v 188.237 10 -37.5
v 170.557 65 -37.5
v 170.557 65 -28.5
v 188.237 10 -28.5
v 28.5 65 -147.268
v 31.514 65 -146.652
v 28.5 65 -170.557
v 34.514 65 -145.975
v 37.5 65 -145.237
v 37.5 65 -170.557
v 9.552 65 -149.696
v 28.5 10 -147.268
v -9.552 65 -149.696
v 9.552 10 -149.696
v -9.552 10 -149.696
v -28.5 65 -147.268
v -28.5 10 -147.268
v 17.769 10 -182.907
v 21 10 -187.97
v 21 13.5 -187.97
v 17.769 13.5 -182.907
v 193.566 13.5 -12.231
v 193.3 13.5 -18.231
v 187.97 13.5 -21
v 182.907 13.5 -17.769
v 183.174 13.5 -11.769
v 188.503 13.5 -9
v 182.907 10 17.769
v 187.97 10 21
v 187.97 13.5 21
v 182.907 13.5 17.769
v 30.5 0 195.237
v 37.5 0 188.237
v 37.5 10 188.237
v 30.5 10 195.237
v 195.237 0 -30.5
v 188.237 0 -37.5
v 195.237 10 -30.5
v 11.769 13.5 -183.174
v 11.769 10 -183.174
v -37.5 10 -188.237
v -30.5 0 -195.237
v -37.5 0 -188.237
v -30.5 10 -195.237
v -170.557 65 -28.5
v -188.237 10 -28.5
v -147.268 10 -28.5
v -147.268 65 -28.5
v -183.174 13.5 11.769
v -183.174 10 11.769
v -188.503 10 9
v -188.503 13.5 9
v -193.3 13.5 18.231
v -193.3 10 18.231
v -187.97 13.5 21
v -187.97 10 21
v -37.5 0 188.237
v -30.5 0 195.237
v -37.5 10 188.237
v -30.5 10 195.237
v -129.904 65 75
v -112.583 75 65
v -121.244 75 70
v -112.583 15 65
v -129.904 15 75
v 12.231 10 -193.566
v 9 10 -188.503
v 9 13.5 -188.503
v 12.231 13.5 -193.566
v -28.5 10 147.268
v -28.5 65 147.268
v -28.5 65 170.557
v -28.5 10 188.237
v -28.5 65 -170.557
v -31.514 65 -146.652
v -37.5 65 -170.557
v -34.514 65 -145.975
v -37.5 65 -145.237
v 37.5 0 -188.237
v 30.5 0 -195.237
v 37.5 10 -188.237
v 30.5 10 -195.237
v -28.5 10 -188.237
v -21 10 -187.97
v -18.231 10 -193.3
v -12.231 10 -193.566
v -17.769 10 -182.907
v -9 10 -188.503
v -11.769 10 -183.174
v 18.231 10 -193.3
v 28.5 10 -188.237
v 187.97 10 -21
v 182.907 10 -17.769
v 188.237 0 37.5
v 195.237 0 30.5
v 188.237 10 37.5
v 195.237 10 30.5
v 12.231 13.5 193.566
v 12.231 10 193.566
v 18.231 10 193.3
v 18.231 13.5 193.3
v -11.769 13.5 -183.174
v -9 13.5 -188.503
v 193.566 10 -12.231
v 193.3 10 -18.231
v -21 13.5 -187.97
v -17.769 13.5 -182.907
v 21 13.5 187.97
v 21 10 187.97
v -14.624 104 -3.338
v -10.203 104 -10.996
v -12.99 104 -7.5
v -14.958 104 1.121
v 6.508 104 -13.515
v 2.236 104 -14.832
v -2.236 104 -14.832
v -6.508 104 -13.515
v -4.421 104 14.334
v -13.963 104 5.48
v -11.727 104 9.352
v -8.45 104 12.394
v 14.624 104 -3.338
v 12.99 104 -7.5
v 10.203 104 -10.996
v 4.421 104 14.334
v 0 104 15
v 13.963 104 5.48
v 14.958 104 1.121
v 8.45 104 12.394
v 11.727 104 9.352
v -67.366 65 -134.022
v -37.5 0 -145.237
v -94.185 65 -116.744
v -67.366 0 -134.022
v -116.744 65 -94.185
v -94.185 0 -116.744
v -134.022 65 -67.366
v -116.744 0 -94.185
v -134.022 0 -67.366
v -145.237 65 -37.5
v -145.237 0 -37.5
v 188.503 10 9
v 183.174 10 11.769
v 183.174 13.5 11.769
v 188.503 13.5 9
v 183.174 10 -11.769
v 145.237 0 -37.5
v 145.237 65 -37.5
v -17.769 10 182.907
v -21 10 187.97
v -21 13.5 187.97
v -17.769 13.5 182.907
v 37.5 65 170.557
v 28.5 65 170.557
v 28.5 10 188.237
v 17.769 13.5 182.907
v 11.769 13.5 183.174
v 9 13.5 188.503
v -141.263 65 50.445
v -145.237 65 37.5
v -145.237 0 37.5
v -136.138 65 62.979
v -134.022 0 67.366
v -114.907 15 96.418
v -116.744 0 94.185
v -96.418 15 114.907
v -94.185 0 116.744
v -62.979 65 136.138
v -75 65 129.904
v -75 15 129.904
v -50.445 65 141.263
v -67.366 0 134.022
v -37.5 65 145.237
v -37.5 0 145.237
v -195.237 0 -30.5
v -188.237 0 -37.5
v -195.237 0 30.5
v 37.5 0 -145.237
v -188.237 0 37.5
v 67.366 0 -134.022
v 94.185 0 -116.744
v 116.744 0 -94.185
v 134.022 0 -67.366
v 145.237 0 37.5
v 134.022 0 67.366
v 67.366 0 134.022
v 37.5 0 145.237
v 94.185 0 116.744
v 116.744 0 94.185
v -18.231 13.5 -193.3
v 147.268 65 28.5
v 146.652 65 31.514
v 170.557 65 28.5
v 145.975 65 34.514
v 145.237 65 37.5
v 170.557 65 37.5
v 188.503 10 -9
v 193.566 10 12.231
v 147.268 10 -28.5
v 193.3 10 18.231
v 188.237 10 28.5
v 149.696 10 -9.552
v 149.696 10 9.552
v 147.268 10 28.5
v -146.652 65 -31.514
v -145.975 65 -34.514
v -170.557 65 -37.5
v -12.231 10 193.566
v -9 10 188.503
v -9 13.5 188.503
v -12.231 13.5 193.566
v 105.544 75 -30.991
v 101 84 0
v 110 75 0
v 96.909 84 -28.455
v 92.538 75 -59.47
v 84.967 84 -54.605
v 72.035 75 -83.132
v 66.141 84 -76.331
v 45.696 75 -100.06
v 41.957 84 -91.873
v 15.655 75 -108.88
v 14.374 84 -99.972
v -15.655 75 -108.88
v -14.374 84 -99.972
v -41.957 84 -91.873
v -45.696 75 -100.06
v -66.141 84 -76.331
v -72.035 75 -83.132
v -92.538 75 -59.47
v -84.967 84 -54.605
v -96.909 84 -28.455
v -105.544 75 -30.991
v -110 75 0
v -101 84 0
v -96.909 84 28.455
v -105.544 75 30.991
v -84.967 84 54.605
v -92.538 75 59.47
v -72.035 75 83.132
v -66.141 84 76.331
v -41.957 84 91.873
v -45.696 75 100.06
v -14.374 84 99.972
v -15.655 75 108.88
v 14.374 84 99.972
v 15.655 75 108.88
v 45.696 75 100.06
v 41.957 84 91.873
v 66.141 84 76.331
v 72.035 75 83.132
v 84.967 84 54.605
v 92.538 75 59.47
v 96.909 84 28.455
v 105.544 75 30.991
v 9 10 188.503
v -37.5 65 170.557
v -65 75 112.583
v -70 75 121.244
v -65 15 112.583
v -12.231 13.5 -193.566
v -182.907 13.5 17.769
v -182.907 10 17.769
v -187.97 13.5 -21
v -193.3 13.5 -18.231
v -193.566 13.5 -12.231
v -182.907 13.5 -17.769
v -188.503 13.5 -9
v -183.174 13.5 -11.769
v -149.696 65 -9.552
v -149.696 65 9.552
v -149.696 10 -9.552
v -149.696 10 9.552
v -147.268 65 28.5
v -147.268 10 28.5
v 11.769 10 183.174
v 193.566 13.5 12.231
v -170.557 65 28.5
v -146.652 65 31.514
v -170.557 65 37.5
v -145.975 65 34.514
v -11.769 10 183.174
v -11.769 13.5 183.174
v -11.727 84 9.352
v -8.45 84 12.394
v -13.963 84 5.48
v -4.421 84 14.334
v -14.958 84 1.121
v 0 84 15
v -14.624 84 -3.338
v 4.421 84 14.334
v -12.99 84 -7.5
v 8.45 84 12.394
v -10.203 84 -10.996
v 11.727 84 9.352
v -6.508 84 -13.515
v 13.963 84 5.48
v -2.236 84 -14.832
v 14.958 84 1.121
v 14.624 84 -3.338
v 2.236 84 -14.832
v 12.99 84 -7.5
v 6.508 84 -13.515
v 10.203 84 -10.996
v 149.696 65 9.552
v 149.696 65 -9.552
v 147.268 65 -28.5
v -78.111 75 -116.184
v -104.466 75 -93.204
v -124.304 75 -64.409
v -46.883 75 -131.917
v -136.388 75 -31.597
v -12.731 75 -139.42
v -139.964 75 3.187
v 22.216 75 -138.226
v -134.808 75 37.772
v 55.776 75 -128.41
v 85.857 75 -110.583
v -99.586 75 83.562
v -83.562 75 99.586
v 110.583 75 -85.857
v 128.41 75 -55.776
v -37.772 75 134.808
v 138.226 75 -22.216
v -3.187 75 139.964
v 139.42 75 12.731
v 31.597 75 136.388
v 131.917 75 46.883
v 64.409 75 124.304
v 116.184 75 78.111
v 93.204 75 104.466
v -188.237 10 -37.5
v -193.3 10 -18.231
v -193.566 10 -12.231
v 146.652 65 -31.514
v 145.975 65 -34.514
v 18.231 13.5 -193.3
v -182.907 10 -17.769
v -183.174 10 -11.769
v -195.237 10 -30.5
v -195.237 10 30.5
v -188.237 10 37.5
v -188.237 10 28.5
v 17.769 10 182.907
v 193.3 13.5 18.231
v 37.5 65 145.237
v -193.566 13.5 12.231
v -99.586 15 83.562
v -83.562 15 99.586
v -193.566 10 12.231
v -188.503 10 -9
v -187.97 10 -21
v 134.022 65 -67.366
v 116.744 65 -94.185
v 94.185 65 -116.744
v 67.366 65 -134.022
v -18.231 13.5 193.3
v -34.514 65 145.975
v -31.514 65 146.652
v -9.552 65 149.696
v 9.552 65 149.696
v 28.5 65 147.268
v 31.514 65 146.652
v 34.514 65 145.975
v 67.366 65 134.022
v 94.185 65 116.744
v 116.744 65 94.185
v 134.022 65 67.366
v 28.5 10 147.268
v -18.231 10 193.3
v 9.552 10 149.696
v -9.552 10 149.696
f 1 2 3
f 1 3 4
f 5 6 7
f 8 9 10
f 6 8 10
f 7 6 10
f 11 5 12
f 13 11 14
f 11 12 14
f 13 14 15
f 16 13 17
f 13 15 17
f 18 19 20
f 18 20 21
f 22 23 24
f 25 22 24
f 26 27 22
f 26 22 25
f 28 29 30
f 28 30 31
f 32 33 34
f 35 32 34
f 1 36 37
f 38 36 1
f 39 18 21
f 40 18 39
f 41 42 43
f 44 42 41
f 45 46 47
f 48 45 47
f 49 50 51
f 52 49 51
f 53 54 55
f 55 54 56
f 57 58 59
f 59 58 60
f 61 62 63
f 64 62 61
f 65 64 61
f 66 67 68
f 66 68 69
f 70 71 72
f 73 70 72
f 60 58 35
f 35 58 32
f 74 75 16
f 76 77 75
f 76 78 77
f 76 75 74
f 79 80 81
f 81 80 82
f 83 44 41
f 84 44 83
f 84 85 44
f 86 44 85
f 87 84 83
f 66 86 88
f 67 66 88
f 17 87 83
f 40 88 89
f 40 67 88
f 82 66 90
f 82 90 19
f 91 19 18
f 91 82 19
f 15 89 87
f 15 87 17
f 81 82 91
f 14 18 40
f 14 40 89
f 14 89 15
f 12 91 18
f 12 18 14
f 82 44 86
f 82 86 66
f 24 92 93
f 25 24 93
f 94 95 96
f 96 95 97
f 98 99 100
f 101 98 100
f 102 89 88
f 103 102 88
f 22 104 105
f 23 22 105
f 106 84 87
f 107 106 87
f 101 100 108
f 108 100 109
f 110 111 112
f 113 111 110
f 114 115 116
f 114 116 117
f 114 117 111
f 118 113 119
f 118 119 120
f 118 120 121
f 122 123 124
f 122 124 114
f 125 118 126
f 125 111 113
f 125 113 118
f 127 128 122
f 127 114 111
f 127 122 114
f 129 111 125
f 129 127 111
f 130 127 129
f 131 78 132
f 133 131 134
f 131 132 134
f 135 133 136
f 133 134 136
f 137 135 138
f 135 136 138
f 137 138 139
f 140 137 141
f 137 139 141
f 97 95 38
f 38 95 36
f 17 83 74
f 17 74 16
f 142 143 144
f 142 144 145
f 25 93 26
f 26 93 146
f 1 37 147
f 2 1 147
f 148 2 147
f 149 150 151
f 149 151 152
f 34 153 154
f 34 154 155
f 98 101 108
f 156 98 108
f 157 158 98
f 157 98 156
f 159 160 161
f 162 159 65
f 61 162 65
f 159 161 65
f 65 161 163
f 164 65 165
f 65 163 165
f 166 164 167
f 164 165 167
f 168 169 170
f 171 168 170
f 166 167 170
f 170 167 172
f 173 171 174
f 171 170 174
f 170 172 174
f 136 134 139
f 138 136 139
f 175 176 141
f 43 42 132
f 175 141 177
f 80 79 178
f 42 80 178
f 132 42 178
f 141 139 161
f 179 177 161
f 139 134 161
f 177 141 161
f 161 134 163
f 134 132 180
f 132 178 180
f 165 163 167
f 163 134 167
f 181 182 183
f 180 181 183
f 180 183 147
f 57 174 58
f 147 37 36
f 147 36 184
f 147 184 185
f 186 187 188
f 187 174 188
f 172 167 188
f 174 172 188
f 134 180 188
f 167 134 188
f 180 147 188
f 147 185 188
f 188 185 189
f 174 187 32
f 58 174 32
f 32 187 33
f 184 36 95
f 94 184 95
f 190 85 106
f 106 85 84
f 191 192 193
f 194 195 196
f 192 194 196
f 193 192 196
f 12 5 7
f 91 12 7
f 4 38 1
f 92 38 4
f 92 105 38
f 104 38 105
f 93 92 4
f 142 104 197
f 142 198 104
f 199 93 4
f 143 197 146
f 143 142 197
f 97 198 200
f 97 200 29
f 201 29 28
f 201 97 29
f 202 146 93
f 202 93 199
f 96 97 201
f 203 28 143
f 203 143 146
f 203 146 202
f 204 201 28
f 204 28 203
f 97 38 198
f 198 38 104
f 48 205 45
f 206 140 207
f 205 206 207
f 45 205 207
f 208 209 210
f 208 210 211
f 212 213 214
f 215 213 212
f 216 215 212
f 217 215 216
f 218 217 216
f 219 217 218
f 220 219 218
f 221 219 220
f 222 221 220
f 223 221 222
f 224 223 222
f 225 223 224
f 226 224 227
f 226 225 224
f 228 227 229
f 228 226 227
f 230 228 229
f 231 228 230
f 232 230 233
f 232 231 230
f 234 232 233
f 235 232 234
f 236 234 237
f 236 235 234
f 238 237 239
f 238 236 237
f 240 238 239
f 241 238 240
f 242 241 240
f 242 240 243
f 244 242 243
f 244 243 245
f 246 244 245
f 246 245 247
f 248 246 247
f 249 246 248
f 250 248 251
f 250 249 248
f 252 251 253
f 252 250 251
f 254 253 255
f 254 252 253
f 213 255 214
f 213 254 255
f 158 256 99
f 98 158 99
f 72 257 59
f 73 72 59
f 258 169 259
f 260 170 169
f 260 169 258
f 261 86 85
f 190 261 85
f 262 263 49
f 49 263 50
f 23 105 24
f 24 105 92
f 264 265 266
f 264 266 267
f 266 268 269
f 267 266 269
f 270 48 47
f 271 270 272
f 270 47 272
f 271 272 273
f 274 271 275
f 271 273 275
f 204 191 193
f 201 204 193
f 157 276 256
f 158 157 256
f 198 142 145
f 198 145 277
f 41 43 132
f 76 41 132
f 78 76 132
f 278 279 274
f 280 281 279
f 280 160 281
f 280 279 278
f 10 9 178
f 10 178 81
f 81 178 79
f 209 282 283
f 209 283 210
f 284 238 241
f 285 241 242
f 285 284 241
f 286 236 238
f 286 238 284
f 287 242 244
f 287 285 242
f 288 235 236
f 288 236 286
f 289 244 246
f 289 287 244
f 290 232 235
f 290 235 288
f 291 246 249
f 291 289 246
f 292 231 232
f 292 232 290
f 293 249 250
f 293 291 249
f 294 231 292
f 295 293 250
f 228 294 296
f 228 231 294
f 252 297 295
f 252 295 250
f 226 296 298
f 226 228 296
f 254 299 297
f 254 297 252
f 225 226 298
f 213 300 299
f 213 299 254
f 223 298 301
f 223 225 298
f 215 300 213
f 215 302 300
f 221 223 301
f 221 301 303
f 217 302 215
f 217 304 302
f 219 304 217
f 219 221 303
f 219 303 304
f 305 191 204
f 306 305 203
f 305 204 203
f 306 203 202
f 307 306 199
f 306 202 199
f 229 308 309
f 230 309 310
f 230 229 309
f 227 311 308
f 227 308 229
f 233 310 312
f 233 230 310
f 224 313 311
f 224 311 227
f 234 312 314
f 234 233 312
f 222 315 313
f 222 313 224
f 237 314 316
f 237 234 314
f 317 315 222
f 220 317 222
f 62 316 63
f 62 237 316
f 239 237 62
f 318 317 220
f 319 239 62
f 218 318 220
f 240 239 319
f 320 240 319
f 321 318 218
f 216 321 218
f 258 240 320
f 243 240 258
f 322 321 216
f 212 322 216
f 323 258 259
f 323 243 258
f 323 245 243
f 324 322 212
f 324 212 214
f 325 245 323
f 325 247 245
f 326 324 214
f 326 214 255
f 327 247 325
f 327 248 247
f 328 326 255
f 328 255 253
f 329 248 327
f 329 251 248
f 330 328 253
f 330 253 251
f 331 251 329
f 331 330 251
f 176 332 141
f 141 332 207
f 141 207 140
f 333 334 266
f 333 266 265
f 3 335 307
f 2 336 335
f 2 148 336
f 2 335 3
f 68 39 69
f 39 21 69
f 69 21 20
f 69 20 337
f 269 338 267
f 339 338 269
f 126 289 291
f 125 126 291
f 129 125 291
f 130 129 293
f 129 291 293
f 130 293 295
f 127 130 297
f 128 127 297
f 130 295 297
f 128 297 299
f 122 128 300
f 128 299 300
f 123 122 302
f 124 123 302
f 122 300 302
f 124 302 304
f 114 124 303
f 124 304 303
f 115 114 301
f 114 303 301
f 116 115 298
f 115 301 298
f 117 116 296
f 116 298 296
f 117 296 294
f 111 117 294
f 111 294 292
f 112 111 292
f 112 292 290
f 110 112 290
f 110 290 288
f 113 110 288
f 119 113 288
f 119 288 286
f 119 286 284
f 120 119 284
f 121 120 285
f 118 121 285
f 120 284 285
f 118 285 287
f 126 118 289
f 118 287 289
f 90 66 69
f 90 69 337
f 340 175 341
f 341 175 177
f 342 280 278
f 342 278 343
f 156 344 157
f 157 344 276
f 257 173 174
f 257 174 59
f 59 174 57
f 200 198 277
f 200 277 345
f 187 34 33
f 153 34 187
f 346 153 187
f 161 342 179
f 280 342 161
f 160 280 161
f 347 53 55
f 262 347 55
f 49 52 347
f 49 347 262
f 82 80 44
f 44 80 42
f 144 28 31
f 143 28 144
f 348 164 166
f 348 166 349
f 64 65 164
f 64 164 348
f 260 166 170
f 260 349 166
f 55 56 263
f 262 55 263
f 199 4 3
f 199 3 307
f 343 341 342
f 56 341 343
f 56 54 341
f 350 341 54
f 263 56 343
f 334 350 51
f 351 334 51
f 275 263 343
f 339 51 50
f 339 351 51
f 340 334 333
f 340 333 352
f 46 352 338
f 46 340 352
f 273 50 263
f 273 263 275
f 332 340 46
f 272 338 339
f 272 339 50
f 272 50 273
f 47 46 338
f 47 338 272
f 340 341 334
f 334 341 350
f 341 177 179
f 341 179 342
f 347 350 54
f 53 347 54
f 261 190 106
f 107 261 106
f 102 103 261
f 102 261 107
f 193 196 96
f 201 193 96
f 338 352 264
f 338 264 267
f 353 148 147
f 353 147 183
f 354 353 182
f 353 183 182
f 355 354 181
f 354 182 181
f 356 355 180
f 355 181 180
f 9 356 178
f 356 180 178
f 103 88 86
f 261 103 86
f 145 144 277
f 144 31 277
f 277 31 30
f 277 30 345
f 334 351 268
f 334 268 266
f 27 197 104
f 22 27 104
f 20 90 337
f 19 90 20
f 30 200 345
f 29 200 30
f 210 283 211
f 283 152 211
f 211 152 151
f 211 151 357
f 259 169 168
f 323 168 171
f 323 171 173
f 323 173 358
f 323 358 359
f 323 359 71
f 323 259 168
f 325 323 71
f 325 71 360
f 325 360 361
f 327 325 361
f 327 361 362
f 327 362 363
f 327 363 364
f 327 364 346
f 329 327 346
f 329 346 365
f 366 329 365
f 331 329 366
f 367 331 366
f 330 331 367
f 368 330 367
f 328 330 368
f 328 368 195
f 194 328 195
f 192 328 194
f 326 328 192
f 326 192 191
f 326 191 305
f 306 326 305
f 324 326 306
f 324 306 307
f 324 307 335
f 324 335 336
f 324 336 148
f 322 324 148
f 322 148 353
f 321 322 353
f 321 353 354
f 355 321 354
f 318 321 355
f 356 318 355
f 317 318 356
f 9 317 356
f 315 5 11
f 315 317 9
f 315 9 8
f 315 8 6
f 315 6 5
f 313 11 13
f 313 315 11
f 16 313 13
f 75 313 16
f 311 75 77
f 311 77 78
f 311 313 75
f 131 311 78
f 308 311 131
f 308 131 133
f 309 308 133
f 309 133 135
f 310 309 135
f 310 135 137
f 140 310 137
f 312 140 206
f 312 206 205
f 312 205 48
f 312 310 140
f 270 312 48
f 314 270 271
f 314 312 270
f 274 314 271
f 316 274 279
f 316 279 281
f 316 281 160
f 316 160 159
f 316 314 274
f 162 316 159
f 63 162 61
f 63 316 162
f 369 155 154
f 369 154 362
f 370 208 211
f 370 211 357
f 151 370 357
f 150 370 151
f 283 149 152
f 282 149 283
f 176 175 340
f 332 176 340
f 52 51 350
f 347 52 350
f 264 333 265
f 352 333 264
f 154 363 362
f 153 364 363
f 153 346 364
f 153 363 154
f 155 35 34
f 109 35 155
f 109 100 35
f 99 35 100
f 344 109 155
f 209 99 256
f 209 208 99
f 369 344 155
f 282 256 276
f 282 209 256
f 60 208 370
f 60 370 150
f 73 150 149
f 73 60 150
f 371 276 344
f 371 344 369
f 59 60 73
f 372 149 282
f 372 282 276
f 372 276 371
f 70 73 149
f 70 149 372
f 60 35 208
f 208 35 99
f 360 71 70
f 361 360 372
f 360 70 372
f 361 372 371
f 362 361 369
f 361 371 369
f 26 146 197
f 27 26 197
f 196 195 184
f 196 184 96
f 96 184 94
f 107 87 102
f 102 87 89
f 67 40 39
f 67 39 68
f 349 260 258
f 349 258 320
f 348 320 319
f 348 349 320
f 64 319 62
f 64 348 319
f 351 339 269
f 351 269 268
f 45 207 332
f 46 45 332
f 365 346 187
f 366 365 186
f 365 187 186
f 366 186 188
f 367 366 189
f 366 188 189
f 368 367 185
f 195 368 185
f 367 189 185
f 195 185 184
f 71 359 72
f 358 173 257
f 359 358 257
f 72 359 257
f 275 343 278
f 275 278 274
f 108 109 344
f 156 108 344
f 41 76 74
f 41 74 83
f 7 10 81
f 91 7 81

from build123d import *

# Parameters (mm, degrees)
SKETCH1_R                    = 150
BOSS_EXTRUDE1_DEPTH          = 75
CHAMFER1_SIZE                = 10
BOSS_EXTRUDE2_START          = -75
BOSS_EXTRUDE2_DEPTH          = 10
CHAMFER2_SIZE                = 7
BOSS_EXTRUDE3_DEPTH          = 9
BOSS_EXTRUDE4_DEPTH          = 3.5
CIRPATTERN2_COUNT            = 4
CIRPATTERN2_COPY_1_DEPTH     = 9
CIRPATTERN2_COPY_2_DEPTH     = 9
CIRPATTERN2_COPY_3_DEPTH     = 9
CIRPATTERN2_COPY_4_DEPTH     = 3.5
CIRPATTERN2_COPY_5_DEPTH     = 3.5
CIRPATTERN2_COPY_6_DEPTH     = 3.5
CHAMFER2_OF_CIRPATTERN2_SIZE = 7
CUT_EXTRUDE2_START           = -60
CUT_EXTRUDE2_DEPTH           = 60
SKETCH7_R                    = 110
BOSS_EXTRUDE5_DEPTH          = 9
BOSS_EXTRUDE5_TAPER          = 45
SKETCH8_R                    = 15
BOSS_EXTRUDE6_DEPTH          = 20


with BuildPart() as part:
    # Sketch1 → Boss-Extrude1 (new body)
    with BuildSketch(Plane(origin=(0, 0, 0), x_dir=(1, 0, 0), z_dir=(0, 1, 0))):
        with Locations(Location((0, 0, 0), (0, 0, 270))):
            Circle(SKETCH1_R)
    extrude(amount=BOSS_EXTRUDE1_DEPTH)

    # Chamfer1
    chamfer1_edges = [part.edges().sort_by_distance(p)[0] for p in [
        (0, 75, -150),
    ]]
    chamfer(chamfer1_edges, length=CHAMFER1_SIZE)

    # Sketch2 → Boss-Extrude2 (add)
    with BuildSketch(Plane(origin=(0, 75, 0), x_dir=(1, 0, 0), z_dir=(0, 1, 0)).offset(BOSS_EXTRUDE2_START)):
        with BuildLine():
            Line((-145.236875483, 37.5), (-195.236875483, 37.5))
            Line((-195.236875483, 37.5), (-195.236875483, -37.5))
            Line((-195.236875483, -37.5), (-145.236875483, -37.5))
            ThreePointArc((-145.236875483, -37.5), (-150, 0), (-145.236875483, 37.5))
        make_face()
    boss_extrude2 = extrude(amount=BOSS_EXTRUDE2_DEPTH)

    # Chamfer2
    chamfer2_edges = [part.edges().sort_by_distance(p)[0] for p in [
        (-195.236875483, 5, -37.5),
        (-195.236875483, 5, 37.5),
    ]]
    chamfer(chamfer2_edges, length=CHAMFER2_SIZE)

    # Sketch4 → Boss-Extrude3 (add)
    with BuildSketch(Plane.XY.offset(37.5)):
        Polygon((-188.236875483, 10), (-145.236875483, 10), (-145.236875483, 65), (-170.556875483, 65), align=None)
    boss_extrude3 = extrude(amount=-BOSS_EXTRUDE3_DEPTH)

    # Sketch5 → Boss-Extrude4 (add)
    with BuildSketch(Plane(origin=(0, 10, 0), x_dir=(1, 0, 0), z_dir=(0, 1, 0))):
        Polygon((-183.173956068, -11.769233661), (-188.503341499, -9), (-193.566260913, -12.230766339), (-193.299794898, -18.230766339), (-187.970409467, -21), (-182.907490052, -17.769233661), align=None)
    boss_extrude4 = extrude(amount=BOSS_EXTRUDE4_DEPTH)

    # Mirror1: Boss-Extrude3, Boss-Extrude4 across plane
    add(boss_extrude3.mirror(Plane.XY))
    add(boss_extrude4.mirror(Plane.XY))

    # CirPattern2: Boss-Extrude2, Boss-Extrude3, Boss-Extrude4 ×4 about axis
    cirpattern2_axis = Axis((0, 0, 0), (0, 1, 0))
    add([boss_extrude2.rotate(cirpattern2_axis, i * 360 / CIRPATTERN2_COUNT) for i in range(1, CIRPATTERN2_COUNT)])
    add([boss_extrude3.rotate(cirpattern2_axis, i * 360 / CIRPATTERN2_COUNT) for i in range(1, CIRPATTERN2_COUNT)])
    add([boss_extrude4.rotate(cirpattern2_axis, i * 360 / CIRPATTERN2_COUNT) for i in range(1, CIRPATTERN2_COUNT)])

    # CirPattern2 copy 1 sketch → CirPattern2 copy 1 (add)
    with BuildSketch(Plane(origin=(-37.5, 0, 0), x_dir=(0, 0, -1), z_dir=(-1, 0, 0))):
        Polygon((-188.236875483, -10), (-145.236875483, -10), (-145.236875483, -65), (-170.556875483, -65), align=None)
    extrude(amount=-CIRPATTERN2_COPY_1_DEPTH)

    # CirPattern2 copy 2 sketch → CirPattern2 copy 2 (add)
    with BuildSketch(Plane(origin=(0, 0, 37.5), x_dir=(-1, 0, 0), z_dir=(0, 0, 1))):
        Polygon((-188.236875483, -10), (-145.236875483, -10), (-145.236875483, -65), (-170.556875483, -65), align=None)
    extrude(amount=-CIRPATTERN2_COPY_2_DEPTH)

    # CirPattern2 copy 3 sketch → CirPattern2 copy 3 (add)
    with BuildSketch(Plane(origin=(37.5, 0, 0), x_dir=(0, 0, 1), z_dir=(1, 0, 0))):
        Polygon((-188.236875483, -10), (-145.236875483, -10), (-145.236875483, -65), (-170.556875483, -65), align=None)
    extrude(amount=-CIRPATTERN2_COPY_3_DEPTH)

    # CirPattern2 copy 4 sketch → CirPattern2 copy 4 (add)
    with BuildSketch(Plane(origin=(0, 10, 0), x_dir=(0, 0, -1), z_dir=(0, 1, 0))):
        Polygon((-183.173956068, 11.769233661), (-188.503341499, 9), (-193.566260913, 12.230766339), (-193.299794898, 18.230766339), (-187.970409467, 21), (-182.907490052, 17.769233661), align=None)
    extrude(amount=CIRPATTERN2_COPY_4_DEPTH)

    # CirPattern2 copy 5 sketch → CirPattern2 copy 5 (add)
    with BuildSketch(Plane(origin=(0, 10, 0), x_dir=(-1, 0, 0), z_dir=(0, 1, 0))):
        Polygon((-183.173956068, 11.769233661), (-188.503341499, 9), (-193.566260913, 12.230766339), (-193.299794898, 18.230766339), (-187.970409467, 21), (-182.907490052, 17.769233661), align=None)
    extrude(amount=CIRPATTERN2_COPY_5_DEPTH)

    # CirPattern2 copy 6 sketch → CirPattern2 copy 6 (add)
    with BuildSketch(Plane.ZX.offset(10)):
        Polygon((-183.173956068, 11.769233661), (-188.503341499, 9), (-193.566260913, 12.230766339), (-193.299794898, 18.230766339), (-187.970409467, 21), (-182.907490052, 17.769233661), align=None)
    extrude(amount=CIRPATTERN2_COPY_6_DEPTH)

    # Chamfer2 of CirPattern2
    chamfer2_of_cirpattern2_edges = [part.edges().sort_by_distance(p)[0] for p in [
        (-37.5, 5, 195.236875483),
        (37.5, 5, 195.236875483),
        (195.236875483, 5, 37.5),
        (195.236875483, 5, -37.5),
        (37.5, 5, -195.236875483),
        (-37.5, 5, -195.236875483),
    ]]
    chamfer(chamfer2_of_cirpattern2_edges, length=CHAMFER2_OF_CIRPATTERN2_SIZE)

    # Sketch6 → Cut-Extrude2 (cut)
    with BuildSketch(Plane(origin=(0, 75, 0), x_dir=(1, 0, 0), z_dir=(0, 1, 0)).offset(CUT_EXTRUDE2_START)):
        with BuildLine():
            Line((-112.583302492, -65), (-129.903810568, -75))
            ThreePointArc((-129.903810568, -75), (-106.066017178, -106.066017178), (-75, -129.903810568))
            Line((-75, -129.903810568), (-65, -112.583302492))
            ThreePointArc((-65, -112.583302492), (-91.923881554, -91.923881554), (-112.583302492, -65))
        make_face()
    extrude(amount=CUT_EXTRUDE2_DEPTH, mode=Mode.SUBTRACT)

    # Sketch7 → Boss-Extrude5 (add)
    with BuildSketch(Plane(origin=(0, 75, 0), x_dir=(1, 0, 0), z_dir=(0, 1, 0))):
        Circle(SKETCH7_R)
    extrude(amount=BOSS_EXTRUDE5_DEPTH, taper=BOSS_EXTRUDE5_TAPER)

    # Sketch8 → Boss-Extrude6 (add)
    with BuildSketch(Plane(origin=(0, 84, 0), x_dir=(1, 0, 0), z_dir=(0, 1, 0))):
        with Locations(Location((0, 0, 0), (0, 0, 270))):
            Circle(SKETCH8_R)
    extrude(amount=BOSS_EXTRUDE6_DEPTH)


solid = part.part
